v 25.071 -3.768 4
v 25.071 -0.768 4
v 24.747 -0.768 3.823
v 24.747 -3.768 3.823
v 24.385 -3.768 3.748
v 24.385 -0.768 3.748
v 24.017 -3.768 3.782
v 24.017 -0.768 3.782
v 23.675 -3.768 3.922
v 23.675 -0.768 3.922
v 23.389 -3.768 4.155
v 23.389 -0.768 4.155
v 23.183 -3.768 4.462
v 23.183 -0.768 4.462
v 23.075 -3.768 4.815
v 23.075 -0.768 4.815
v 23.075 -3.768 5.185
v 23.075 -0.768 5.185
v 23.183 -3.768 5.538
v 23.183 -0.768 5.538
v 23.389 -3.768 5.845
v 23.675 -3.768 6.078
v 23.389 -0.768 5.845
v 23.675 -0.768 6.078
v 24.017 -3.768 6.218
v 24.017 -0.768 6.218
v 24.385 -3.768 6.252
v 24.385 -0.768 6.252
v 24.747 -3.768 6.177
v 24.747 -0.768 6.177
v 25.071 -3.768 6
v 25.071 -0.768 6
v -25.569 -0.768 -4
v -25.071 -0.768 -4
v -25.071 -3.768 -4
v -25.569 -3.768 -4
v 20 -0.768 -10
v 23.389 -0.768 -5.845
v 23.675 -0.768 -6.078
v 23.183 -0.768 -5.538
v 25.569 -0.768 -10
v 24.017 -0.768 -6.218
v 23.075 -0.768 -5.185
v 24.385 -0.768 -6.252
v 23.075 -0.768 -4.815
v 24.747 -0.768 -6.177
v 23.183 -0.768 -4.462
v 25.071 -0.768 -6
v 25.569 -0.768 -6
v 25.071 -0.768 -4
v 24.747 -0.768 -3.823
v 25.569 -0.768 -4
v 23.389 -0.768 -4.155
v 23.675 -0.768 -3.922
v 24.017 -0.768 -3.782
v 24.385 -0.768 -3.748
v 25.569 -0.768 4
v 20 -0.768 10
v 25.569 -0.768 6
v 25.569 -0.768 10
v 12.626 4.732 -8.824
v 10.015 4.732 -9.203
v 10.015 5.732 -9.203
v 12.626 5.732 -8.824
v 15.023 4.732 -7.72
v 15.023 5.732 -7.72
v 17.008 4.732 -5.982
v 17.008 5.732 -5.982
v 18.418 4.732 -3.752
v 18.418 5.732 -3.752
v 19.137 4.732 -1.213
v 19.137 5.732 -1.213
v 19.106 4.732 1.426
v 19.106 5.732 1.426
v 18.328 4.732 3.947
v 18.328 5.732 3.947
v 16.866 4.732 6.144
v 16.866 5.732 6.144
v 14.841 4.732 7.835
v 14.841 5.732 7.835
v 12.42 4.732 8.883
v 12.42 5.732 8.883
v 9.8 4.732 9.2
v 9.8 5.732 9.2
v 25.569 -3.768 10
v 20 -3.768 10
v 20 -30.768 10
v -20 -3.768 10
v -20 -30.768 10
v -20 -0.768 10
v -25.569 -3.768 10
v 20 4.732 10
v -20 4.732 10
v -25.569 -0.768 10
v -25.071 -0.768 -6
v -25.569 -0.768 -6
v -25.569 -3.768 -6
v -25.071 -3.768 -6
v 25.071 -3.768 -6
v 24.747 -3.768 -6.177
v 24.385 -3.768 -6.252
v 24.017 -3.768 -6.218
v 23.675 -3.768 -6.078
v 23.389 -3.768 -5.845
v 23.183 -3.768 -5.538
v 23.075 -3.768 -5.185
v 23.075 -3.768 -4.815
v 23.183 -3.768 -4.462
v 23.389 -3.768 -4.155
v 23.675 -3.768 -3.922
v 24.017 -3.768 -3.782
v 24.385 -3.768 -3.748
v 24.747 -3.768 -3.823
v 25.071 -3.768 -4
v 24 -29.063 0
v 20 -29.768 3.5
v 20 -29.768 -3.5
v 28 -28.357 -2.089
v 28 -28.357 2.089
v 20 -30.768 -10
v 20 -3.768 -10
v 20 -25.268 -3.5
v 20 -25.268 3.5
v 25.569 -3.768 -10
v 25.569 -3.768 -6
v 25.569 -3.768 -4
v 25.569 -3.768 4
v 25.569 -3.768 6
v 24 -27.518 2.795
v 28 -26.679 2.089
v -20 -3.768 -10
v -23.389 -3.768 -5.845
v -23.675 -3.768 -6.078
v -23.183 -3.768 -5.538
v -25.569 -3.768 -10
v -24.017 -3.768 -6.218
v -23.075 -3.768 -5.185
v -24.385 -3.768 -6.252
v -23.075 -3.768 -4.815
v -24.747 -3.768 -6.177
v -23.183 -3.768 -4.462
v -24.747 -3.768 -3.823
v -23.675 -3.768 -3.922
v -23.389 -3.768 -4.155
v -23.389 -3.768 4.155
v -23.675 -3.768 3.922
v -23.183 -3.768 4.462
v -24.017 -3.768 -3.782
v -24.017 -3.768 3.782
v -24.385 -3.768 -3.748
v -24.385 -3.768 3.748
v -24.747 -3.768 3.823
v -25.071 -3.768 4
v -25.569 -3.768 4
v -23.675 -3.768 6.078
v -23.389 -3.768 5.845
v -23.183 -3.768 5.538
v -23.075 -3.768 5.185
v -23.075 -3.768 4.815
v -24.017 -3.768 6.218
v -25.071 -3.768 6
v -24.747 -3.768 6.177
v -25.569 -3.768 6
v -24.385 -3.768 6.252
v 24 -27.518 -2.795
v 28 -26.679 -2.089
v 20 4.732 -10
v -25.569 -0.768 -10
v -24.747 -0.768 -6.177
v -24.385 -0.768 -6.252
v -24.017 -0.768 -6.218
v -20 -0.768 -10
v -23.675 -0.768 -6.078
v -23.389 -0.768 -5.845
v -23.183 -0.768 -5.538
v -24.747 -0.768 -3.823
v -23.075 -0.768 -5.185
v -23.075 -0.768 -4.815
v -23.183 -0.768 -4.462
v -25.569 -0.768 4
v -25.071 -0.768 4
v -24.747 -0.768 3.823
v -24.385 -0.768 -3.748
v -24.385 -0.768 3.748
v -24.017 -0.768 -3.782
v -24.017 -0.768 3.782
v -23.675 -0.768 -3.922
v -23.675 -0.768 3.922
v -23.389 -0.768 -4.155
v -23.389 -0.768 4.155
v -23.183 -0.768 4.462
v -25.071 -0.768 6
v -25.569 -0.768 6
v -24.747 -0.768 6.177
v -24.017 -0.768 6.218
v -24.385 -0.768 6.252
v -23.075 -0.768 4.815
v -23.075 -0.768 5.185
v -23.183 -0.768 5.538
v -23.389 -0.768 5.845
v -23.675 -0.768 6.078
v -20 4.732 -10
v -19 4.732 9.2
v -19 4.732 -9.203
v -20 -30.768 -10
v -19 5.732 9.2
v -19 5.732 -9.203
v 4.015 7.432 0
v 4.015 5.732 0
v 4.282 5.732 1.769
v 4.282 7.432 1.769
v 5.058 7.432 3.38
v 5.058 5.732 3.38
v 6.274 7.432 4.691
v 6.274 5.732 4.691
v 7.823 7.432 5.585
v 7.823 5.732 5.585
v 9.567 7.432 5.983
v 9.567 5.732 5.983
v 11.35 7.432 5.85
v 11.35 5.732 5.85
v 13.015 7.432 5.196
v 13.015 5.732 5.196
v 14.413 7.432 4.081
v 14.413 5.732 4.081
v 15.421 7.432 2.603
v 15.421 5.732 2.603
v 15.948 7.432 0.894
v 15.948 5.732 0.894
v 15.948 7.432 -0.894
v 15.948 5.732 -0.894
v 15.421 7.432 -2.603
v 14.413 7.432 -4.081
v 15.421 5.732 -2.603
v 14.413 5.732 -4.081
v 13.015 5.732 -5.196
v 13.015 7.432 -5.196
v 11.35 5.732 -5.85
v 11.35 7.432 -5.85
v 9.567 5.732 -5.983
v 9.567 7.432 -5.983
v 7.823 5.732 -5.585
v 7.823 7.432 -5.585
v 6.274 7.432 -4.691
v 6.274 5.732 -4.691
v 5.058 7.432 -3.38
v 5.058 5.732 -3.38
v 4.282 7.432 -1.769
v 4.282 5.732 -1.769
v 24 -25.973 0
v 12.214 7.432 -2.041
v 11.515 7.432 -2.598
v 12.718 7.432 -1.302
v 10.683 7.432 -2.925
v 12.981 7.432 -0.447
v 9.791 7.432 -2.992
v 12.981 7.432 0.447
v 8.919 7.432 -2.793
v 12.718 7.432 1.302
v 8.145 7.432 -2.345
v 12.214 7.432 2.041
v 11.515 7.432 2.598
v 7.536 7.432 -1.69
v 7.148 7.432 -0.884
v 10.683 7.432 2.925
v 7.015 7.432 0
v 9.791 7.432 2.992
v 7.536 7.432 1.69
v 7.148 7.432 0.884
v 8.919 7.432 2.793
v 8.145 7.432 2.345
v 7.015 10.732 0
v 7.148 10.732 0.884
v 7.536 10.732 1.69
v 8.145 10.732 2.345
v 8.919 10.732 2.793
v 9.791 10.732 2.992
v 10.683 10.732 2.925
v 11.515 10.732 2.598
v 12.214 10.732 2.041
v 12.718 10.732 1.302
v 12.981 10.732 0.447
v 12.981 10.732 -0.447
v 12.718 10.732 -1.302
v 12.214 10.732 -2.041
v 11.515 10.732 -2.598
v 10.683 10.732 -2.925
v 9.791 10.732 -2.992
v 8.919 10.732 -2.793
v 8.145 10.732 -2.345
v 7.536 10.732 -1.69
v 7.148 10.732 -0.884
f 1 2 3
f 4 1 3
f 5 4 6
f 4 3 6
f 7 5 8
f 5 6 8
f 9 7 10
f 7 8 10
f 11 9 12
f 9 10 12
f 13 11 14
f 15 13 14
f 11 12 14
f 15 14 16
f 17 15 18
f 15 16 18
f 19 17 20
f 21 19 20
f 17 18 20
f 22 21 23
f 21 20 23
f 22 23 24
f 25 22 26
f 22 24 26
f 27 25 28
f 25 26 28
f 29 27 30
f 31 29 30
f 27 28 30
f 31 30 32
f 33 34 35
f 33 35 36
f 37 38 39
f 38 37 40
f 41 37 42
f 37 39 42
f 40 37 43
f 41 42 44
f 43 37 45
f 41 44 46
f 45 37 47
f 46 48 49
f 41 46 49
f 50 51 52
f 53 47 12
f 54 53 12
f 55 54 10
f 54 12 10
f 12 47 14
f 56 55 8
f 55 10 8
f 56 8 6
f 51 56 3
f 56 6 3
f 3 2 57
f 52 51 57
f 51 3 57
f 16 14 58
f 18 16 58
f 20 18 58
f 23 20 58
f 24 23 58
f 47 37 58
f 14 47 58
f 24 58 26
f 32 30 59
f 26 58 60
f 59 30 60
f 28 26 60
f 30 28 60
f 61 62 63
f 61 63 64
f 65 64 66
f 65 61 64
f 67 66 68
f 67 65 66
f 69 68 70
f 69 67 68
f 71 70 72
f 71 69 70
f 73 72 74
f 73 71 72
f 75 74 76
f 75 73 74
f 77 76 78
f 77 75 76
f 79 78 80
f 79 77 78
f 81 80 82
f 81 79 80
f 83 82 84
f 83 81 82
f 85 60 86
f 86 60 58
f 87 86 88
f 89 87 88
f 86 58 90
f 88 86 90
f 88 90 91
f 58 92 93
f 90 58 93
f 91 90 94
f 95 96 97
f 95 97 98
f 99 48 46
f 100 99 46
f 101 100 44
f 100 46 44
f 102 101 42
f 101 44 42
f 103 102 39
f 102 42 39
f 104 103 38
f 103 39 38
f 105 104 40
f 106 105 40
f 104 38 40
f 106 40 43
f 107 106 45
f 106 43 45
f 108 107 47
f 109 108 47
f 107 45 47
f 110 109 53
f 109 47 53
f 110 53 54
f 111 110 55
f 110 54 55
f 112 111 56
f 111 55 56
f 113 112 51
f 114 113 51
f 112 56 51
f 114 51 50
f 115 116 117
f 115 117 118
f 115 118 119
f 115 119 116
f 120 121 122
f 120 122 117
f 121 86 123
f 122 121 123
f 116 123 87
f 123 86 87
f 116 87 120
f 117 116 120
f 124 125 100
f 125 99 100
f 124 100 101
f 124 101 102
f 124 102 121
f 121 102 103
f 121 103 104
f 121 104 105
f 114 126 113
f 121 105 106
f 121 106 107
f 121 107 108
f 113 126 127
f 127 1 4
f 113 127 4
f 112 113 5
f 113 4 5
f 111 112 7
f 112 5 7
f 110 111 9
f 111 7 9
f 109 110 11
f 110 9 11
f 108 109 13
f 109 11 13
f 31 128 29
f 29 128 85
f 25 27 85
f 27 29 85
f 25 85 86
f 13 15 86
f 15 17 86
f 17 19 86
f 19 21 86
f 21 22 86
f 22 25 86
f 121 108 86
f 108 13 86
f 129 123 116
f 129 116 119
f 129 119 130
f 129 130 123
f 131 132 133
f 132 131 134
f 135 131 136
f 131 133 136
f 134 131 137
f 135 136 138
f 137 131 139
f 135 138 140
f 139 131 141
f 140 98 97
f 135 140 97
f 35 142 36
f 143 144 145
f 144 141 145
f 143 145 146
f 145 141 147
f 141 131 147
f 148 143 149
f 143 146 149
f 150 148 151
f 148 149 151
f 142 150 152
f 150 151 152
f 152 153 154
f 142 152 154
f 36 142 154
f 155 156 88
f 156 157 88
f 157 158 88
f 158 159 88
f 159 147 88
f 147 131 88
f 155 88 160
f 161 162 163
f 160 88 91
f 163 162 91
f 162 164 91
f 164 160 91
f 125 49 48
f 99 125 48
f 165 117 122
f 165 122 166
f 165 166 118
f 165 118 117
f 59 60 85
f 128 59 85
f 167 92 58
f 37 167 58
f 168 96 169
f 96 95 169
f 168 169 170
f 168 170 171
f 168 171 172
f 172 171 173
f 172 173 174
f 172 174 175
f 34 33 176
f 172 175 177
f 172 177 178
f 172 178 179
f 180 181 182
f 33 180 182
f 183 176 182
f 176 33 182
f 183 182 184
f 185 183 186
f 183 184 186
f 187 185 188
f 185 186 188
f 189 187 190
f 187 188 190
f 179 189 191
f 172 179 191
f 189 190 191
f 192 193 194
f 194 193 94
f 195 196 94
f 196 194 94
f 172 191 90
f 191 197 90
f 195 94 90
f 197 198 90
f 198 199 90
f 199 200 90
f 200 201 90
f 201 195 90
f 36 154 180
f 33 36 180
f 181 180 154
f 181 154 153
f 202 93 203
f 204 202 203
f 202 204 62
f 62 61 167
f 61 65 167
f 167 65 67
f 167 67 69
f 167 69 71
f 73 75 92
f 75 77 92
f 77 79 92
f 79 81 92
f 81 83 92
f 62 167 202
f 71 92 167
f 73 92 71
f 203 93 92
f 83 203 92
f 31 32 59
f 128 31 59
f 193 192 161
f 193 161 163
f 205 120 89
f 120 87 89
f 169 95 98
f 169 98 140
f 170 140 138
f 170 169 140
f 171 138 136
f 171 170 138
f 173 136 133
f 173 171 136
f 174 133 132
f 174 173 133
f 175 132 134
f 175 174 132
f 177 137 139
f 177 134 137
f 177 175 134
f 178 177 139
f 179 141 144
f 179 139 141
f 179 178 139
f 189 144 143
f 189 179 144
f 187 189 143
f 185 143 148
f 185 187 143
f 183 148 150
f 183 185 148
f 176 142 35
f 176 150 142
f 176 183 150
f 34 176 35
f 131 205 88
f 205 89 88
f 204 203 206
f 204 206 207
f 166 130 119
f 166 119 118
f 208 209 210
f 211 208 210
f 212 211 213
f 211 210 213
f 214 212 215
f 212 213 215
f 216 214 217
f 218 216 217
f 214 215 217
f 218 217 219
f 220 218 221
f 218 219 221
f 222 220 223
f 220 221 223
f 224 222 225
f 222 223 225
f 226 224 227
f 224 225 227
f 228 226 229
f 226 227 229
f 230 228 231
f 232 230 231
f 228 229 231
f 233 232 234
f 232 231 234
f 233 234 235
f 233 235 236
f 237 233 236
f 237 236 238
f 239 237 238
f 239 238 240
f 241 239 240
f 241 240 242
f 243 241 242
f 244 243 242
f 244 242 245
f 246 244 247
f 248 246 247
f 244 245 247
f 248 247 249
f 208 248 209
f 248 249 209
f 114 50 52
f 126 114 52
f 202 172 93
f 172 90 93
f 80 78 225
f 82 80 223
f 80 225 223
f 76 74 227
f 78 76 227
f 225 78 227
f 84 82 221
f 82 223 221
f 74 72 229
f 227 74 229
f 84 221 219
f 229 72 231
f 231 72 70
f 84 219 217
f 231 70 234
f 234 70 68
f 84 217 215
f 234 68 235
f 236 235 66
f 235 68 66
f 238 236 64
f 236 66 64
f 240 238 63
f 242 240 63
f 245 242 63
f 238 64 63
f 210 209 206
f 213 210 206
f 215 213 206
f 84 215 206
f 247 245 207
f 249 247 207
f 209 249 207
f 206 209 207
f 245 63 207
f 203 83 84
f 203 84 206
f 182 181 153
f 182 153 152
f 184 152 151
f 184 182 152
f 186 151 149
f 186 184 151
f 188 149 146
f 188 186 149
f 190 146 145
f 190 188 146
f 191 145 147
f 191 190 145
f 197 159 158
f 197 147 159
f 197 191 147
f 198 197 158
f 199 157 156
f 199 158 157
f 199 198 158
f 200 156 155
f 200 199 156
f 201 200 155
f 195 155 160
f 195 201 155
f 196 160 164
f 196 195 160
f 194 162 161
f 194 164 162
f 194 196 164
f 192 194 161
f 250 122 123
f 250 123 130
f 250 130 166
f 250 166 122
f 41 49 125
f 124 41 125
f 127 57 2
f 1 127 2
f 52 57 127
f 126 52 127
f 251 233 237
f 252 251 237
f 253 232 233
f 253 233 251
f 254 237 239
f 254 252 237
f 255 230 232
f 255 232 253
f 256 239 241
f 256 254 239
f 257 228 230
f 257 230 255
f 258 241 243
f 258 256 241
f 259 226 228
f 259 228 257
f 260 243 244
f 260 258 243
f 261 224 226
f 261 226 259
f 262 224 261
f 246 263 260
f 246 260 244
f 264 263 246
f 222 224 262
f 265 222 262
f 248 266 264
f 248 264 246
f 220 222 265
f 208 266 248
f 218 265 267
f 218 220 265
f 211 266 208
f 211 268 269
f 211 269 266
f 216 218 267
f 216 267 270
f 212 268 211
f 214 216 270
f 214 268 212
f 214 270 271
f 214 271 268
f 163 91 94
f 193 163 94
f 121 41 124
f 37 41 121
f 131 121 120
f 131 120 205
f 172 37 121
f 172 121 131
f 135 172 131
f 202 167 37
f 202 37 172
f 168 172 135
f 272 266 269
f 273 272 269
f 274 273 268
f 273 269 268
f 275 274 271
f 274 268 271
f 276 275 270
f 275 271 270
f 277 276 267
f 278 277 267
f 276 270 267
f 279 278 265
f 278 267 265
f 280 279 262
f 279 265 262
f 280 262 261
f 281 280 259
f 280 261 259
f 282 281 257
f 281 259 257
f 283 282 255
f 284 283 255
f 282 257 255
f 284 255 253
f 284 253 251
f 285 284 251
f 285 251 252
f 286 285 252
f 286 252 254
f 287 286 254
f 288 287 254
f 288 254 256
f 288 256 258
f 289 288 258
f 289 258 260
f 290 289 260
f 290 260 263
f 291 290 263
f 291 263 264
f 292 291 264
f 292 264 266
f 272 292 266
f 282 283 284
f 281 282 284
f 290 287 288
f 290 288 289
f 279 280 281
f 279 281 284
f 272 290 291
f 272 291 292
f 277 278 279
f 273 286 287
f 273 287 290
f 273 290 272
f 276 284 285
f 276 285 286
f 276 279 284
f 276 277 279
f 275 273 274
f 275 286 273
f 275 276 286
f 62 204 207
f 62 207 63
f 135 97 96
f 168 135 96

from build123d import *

# Parameters (mm, degrees)
RESSALTO_EXTRUS_O1_DEPTH = 10
CORTE_EXTRUS_O1_DEPTH    = 10
RESSALTO_EXTRUS_O2_DEPTH = 1
ESBO_O4_R                = 3
RESSALTO_EXTRUS_O3_DEPTH = 5
ESBO_O5_R                = 6
RESSALTO_EXTRUS_O4_DEPTH = 1.7
ESBO_O7_W                = 7
ESBO_O7_H                = 4.5
RESSALTO_EXTRUS_O5_DEPTH = 8
RESSALTO_EXTRUS_O5_TAPER = 10


with BuildPart() as part:
    # Esboço1 → Ressalto-extrusão1 (new, symmetric)
    with BuildSketch(Plane.XY):
        Polygon((20, -0.767915455), (25.568877633, -0.767915455), (25.568877633, -3.767915455), (20, -3.767915455), (20, -30.767915455), (-20, -30.767915455), (-20, -3.767915455), (-25.568877633, -3.767915455), (-25.568877633, -0.767915455), (-20, -0.767915455), (-20, 4.732084545), (20, 4.732084545), align=None)
    extrude(amount=RESSALTO_EXTRUS_O1_DEPTH, both=True)

    # Esboço6 → Corte-extrusão1 (cut)
    with BuildSketch(Plane(origin=(0, -0.767915455, 0), x_dir=(1, 0, 0), z_dir=(0, 1, 0))):
        with BuildLine():
            Line((25.071445053, 4), (25.568877633, 4))
            Line((25.568877633, 4), (25.568877633, 6))
            Line((25.568877633, 6), (25.071445053, 6))
            ThreePointArc((25.071445053, 6), (23.061122367, 5), (25.071445053, 4))
        make_face()
        with BuildLine():
            Line((25.568877633, -6), (25.568877633, -4))
            Line((25.568877633, -4), (25.071445053, -4))
            ThreePointArc((25.071445053, -4), (23.061122367, -5), (25.071445053, -6))
            Line((25.071445053, -6), (25.568877633, -6))
        make_face()
        with BuildLine():
            ThreePointArc((-25.071445053, 6), (-23.061122367, 5), (-25.071445053, 4))
            Line((-25.071445053, 4), (-25.568877633, 4))
            Line((-25.568877633, 4), (-25.568877633, 6))
            Line((-25.568877633, 6), (-25.071445053, 6))
        make_face()
        with BuildLine():
            ThreePointArc((-25.071445053, -4), (-23.061122367, -5), (-25.071445053, -6))
            Line((-25.071445053, -6), (-25.568877633, -6))
            Line((-25.568877633, -6), (-25.568877633, -4))
            Line((-25.568877633, -4), (-25.071445053, -4))
        make_face()
    extrude(amount=-CORTE_EXTRUS_O1_DEPTH, mode=Mode.SUBTRACT)

    # Esboço3 → Ressalto-extrusão2 (add)
    with BuildSketch(Plane(origin=(0, 4.732084545, 0), x_dir=(1, 0, 0), z_dir=(0, 1, 0))):
        with BuildLine():
            Line((-19, 9.202511885), (10.015, 9.202511885))
            ThreePointArc((10.015, 9.202511885), (19.216883893, -0.107507336), (9.8, -9.2))
            Line((9.8, -9.2), (-19, -9.2))
            Line((-19, -9.2), (-19, 9.202511885))
        make_face()
    extrude(amount=RESSALTO_EXTRUS_O2_DEPTH)

    # Esboço4 → Ressalto-extrusão3 (add)
    with BuildSketch(Plane(origin=(0, 5.732084545, 0), x_dir=(1, 0, 0), z_dir=(0, 1, 0))):
        with Locations(Location((10.015, 0, 0), (0, 0, 180))):
            Circle(ESBO_O4_R)
    extrude(amount=RESSALTO_EXTRUS_O3_DEPTH)

    # Esboço5 → Ressalto-extrusão4 (add)
    with BuildSketch(Plane(origin=(0, 5.732084545, 0), x_dir=(1, 0, 0), z_dir=(0, 1, 0))):
        with Locations(Location((10.015, 0, 0), (0, 0, 180))):
            Circle(ESBO_O5_R)
    extrude(amount=RESSALTO_EXTRUS_O4_DEPTH)

    # Esboço7 → Ressalto-extrusão5 (add)
    with BuildSketch(Plane(origin=(20, 0, 0), x_dir=(0, 0, -1), z_dir=(1, 0, 0))):
        with Locations((0, -27.517915455)):
            Rectangle(ESBO_O7_W, ESBO_O7_H)
    extrude(amount=RESSALTO_EXTRUS_O5_DEPTH, taper=RESSALTO_EXTRUS_O5_TAPER)


solid = part.part
